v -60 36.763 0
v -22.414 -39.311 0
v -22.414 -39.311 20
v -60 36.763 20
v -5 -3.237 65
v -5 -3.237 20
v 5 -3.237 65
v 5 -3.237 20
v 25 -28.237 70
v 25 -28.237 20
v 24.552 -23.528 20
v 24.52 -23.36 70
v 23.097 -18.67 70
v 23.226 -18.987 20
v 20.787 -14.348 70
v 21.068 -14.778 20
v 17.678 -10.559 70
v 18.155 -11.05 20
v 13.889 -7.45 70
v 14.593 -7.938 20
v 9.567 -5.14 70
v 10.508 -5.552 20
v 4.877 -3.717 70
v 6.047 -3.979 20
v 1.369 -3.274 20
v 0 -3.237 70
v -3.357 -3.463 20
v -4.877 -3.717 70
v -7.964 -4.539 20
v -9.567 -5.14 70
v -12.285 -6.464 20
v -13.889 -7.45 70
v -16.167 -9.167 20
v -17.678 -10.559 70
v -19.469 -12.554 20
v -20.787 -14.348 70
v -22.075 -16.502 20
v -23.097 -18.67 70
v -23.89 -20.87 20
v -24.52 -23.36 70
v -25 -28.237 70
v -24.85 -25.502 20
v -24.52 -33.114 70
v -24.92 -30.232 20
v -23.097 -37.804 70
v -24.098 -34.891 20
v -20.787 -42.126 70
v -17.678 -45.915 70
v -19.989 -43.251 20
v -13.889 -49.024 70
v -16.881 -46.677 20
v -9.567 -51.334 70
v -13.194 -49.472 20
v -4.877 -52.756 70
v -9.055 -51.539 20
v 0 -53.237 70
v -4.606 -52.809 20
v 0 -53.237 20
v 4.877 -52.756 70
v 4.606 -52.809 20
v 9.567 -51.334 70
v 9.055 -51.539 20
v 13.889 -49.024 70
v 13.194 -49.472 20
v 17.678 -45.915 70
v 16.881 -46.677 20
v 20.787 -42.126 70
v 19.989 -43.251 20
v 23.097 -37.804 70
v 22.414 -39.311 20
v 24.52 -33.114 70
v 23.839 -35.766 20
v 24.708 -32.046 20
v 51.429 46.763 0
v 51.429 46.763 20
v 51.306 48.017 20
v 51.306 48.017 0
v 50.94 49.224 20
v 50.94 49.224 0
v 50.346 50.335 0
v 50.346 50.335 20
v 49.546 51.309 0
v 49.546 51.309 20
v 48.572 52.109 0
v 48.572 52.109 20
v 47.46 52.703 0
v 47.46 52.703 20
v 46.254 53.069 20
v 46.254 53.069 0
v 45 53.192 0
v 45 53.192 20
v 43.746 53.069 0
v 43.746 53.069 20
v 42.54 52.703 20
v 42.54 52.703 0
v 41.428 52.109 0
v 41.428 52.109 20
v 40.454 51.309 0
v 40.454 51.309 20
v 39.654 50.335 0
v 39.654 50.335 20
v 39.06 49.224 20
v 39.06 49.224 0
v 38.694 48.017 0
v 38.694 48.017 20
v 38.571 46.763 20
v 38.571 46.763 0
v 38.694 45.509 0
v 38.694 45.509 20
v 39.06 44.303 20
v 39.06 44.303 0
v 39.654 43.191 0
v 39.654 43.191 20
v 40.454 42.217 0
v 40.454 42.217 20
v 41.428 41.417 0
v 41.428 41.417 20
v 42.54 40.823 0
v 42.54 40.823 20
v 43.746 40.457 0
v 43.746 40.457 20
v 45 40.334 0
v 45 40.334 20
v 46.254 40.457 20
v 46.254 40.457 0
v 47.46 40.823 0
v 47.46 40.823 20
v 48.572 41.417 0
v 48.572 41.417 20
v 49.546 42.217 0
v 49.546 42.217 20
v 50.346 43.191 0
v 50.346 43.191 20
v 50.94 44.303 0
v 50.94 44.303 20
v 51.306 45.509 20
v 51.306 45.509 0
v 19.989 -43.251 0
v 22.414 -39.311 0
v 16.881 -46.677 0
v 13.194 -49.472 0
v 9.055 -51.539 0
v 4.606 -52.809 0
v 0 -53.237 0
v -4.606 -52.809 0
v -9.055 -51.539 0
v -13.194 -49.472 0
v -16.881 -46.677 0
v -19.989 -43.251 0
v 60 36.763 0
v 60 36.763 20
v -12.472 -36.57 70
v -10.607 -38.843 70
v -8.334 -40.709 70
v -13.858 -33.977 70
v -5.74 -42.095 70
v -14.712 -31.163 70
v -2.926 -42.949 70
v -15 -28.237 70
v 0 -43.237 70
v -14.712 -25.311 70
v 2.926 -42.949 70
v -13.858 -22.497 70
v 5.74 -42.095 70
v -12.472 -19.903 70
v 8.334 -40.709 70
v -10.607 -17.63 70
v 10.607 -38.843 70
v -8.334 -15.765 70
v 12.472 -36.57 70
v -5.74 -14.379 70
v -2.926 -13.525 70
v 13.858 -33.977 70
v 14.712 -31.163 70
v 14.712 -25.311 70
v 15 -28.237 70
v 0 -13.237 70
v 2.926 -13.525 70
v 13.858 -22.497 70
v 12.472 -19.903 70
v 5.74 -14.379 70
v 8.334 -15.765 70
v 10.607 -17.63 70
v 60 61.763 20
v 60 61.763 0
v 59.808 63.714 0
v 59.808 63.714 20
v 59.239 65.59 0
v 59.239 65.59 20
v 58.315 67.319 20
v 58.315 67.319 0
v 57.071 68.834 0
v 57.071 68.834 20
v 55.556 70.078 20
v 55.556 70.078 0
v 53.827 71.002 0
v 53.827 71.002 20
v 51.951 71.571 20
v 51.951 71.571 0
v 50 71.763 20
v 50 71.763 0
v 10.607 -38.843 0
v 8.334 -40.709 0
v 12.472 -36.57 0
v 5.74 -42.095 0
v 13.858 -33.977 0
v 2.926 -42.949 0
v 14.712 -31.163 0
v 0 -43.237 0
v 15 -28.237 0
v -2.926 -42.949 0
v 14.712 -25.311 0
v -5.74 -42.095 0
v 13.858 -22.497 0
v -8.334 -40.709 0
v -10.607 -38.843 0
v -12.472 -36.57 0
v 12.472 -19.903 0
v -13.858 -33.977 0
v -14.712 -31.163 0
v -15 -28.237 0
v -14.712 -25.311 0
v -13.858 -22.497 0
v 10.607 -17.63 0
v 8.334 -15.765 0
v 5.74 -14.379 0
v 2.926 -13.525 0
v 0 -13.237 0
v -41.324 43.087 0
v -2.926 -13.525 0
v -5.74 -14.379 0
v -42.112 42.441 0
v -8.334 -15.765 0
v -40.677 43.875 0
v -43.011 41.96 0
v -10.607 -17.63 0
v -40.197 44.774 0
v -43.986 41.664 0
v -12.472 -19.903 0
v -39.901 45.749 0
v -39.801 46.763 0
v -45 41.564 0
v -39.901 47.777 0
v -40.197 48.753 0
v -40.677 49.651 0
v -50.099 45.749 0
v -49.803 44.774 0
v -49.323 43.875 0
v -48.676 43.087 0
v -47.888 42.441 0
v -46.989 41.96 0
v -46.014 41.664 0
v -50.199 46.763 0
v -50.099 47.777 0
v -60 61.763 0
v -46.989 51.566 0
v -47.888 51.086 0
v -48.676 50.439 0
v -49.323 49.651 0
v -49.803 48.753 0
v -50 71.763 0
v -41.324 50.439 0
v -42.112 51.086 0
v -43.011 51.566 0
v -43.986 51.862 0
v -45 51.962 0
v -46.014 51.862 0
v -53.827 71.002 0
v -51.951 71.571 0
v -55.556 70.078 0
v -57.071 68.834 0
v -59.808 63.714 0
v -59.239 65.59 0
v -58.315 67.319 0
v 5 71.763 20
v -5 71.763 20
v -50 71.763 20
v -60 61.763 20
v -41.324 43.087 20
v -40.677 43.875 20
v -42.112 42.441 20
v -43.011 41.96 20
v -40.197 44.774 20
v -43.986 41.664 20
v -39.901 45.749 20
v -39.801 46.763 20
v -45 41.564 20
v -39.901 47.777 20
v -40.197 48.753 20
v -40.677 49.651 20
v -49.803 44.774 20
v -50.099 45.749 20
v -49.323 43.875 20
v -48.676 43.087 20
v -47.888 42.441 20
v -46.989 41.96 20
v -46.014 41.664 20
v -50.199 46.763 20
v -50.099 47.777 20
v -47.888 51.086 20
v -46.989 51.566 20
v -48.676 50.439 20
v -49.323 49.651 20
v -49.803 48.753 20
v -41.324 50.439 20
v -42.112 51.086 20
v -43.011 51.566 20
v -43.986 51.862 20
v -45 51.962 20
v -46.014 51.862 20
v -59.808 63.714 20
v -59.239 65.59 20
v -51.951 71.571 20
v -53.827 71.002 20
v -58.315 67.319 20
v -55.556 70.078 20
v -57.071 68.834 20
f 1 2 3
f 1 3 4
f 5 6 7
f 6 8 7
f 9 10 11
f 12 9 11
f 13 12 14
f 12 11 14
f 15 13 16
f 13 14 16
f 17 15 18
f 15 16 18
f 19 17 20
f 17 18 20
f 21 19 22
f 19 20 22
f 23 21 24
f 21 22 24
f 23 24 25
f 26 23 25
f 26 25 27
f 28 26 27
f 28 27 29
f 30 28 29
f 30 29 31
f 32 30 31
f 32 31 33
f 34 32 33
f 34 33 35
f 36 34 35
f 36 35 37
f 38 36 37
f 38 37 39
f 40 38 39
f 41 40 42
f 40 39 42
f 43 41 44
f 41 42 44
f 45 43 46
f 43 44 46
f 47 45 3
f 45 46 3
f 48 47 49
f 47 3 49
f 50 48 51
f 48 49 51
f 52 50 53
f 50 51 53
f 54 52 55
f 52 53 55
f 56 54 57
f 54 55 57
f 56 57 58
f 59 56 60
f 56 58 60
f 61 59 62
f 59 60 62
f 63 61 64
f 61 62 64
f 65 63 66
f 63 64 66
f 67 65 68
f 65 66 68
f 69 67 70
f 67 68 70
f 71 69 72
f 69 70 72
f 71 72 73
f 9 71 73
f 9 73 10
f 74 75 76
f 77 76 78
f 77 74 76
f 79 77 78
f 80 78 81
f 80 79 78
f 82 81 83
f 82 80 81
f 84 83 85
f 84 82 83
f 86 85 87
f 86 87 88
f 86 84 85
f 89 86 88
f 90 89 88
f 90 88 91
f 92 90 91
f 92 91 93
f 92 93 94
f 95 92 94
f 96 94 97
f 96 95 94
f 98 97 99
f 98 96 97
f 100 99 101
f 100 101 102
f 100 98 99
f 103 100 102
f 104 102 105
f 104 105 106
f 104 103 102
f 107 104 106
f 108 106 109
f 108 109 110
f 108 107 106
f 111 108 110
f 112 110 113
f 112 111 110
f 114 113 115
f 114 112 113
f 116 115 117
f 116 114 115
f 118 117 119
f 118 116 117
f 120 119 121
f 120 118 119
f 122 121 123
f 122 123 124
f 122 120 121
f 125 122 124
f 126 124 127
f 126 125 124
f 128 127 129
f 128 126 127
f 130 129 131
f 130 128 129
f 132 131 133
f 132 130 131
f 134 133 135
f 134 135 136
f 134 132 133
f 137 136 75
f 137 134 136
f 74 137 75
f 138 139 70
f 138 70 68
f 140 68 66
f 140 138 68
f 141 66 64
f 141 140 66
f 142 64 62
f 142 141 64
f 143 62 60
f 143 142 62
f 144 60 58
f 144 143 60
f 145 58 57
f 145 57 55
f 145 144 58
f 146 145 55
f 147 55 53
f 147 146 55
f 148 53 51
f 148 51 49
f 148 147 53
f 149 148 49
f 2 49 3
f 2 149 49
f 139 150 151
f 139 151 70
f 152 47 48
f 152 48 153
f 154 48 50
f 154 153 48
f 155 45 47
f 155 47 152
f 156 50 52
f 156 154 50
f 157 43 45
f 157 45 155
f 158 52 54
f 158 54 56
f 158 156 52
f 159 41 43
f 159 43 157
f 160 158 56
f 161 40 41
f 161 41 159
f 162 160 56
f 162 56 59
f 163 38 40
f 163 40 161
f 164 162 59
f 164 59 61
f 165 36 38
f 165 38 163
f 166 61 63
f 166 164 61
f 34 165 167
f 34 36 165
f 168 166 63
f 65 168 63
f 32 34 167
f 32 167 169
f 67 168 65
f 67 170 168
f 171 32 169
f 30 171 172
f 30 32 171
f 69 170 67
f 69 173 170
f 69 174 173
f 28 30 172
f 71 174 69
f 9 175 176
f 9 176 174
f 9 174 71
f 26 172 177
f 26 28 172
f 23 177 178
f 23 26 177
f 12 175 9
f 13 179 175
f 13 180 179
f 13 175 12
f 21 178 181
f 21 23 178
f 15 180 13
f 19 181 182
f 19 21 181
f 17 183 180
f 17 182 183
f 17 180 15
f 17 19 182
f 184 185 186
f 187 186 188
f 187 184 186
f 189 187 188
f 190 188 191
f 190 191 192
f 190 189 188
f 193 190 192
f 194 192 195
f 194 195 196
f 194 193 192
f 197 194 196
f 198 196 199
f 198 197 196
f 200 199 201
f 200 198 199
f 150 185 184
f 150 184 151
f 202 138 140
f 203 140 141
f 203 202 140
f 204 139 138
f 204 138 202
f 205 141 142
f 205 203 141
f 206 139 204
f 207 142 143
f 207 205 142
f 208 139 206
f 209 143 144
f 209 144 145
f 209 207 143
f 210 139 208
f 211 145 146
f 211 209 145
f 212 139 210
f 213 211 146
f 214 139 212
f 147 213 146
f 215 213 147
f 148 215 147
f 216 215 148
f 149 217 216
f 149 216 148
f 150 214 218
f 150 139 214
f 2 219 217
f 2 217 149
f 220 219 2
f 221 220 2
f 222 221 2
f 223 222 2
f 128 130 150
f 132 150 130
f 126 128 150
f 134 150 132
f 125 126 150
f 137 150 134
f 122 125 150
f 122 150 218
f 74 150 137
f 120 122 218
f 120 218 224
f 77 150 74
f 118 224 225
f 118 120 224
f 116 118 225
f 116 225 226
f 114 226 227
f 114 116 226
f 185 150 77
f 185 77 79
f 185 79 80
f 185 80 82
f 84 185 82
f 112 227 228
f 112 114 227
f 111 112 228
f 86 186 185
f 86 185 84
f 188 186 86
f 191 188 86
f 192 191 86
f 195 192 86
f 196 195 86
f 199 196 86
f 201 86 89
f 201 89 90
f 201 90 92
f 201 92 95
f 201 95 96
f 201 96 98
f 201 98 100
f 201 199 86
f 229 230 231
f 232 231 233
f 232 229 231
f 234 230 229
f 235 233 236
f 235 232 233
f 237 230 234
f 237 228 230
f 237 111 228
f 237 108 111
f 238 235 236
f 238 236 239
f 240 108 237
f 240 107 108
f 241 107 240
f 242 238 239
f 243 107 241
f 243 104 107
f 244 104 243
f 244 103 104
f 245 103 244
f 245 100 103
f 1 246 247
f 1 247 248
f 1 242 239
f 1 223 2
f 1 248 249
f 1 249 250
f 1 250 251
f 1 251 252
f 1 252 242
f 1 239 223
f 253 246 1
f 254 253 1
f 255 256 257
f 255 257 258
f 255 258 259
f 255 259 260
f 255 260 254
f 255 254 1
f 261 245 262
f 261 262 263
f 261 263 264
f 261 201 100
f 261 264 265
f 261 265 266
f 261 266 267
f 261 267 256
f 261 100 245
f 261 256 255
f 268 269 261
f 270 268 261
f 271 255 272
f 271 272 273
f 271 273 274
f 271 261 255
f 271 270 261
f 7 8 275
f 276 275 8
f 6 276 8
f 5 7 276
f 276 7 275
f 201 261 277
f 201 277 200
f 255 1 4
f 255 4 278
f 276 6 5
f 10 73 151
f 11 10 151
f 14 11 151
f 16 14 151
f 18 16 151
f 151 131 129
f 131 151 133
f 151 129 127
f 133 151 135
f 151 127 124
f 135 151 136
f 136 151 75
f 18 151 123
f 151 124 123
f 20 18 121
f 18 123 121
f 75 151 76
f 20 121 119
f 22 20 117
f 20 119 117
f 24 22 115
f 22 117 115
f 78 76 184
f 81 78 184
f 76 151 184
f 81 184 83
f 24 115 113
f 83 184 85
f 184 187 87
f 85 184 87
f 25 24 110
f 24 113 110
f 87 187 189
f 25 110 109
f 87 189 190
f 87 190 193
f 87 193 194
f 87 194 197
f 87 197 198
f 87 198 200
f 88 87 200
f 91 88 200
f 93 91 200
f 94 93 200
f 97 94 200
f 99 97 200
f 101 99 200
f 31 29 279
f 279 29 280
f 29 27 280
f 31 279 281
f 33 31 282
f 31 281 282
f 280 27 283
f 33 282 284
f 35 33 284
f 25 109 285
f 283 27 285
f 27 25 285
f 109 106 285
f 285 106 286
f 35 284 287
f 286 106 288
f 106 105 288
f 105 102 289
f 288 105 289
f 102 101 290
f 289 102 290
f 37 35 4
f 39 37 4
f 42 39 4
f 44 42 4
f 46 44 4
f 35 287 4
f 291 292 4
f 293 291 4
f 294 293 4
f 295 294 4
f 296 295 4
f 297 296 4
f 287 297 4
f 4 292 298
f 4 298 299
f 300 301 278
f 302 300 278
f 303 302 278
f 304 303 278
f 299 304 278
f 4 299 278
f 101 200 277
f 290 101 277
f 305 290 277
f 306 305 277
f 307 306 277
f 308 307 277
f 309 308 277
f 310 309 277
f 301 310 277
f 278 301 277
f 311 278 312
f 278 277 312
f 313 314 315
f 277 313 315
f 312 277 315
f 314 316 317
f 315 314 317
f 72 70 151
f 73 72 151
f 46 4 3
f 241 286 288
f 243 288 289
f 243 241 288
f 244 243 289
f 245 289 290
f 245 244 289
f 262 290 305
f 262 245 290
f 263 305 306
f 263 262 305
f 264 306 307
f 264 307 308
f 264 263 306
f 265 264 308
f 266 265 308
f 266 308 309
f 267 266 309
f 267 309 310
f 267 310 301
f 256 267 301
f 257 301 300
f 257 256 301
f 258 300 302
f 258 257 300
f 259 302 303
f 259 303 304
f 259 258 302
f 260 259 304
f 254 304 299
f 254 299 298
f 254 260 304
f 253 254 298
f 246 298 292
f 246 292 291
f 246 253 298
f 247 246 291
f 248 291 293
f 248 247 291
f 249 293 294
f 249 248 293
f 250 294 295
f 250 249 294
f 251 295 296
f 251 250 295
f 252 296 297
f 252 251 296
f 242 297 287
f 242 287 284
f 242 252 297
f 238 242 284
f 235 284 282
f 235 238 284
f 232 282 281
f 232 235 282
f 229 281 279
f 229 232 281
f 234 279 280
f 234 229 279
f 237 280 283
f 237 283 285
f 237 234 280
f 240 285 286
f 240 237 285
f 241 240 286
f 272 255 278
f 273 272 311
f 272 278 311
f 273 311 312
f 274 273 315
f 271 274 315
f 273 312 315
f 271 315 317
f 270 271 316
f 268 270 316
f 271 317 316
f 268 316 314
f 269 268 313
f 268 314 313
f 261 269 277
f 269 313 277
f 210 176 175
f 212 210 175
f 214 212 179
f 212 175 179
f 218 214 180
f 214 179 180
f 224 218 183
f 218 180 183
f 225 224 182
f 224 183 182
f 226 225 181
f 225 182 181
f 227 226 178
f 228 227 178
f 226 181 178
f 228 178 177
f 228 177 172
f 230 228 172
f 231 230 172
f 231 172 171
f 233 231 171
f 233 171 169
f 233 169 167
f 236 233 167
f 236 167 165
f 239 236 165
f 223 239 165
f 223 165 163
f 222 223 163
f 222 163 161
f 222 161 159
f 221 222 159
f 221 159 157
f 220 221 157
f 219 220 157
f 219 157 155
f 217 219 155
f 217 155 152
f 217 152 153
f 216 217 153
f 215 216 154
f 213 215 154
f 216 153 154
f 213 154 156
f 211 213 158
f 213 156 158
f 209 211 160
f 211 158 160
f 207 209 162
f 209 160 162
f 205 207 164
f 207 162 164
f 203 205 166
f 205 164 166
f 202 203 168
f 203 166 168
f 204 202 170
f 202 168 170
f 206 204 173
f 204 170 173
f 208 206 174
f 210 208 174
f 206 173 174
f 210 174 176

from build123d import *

# Parameters (mm, degrees)
SKETCH1_R           = 5.198777242
SKETCH1_R_2         = 6.429296023
BOSS_EXTRUDE2_DEPTH = 20
SKETCH2_R           = 25
BOSS_EXTRUDE3_DEPTH = 50
SKETCH3_R           = 15
CUT_EXTRUDE1_DEPTH  = 71
BOSS_EXTRUDE5_DEPTH = 5
FILLET1_R           = 10


with BuildPart() as part:
    # Sketch1 → Boss-Extrude2 (new body)
    with BuildSketch(Plane.XY):
        with BuildLine():
            Line((-60, 71.763138826), (60, 71.763138826))
            Line((60, 71.763138826), (60, 36.763138826))
            Line((60, 36.763138826), (22.413523621, -39.310882977))
            ThreePointArc((22.413523621, -39.310882977), (0, -53.236861174), (-22.413523621, -39.310882977))
            Line((-22.413523621, -39.310882977), (-60, 36.763138826))
            Line((-60, 36.763138826), (-60, 71.763138826))
        make_face()
        with Locations((-45, 46.763138826)):
            Circle(SKETCH1_R, mode=Mode.SUBTRACT)
        with Locations((45, 46.763138826)):
            Circle(SKETCH1_R_2, mode=Mode.SUBTRACT)
    extrude(amount=BOSS_EXTRUDE2_DEPTH)

    # Sketch2 → Boss-Extrude3 (add)
    with BuildSketch(Plane.XY.offset(20)):
        with Locations((0, -28.236861174)):
            Circle(SKETCH2_R)
    extrude(amount=BOSS_EXTRUDE3_DEPTH)

    # Sketch3 → Cut-Extrude1 (cut, through all)
    with BuildSketch(Plane.XY.offset(70)):
        with Locations((0, -28.236861174)):
            Circle(SKETCH3_R)
    extrude(amount=-CUT_EXTRUDE1_DEPTH, mode=Mode.SUBTRACT)

    # Fillet1
    fillet1_edges = [part.edges().sort_by_distance(p)[0] for p in [
        (-60, 71.763138826, 10),
        (60, 71.763138826, 10),
    ]]
    fillet(fillet1_edges, radius=FILLET1_R)


with BuildPart() as body_2:
    # Sketch4 → Boss-Extrude5 (new body, symmetric)
    with BuildSketch(Plane(origin=(0, 0, 0), x_dir=(0, 0, -1), z_dir=(1, 0, 0))):
        Polygon((-20, 71.763138826), (-20, -3.236861174), (-65, -3.236861174), align=None)
    extrude(amount=BOSS_EXTRUDE5_DEPTH, both=True)


solid = Compound([part.part, body_2.part])
